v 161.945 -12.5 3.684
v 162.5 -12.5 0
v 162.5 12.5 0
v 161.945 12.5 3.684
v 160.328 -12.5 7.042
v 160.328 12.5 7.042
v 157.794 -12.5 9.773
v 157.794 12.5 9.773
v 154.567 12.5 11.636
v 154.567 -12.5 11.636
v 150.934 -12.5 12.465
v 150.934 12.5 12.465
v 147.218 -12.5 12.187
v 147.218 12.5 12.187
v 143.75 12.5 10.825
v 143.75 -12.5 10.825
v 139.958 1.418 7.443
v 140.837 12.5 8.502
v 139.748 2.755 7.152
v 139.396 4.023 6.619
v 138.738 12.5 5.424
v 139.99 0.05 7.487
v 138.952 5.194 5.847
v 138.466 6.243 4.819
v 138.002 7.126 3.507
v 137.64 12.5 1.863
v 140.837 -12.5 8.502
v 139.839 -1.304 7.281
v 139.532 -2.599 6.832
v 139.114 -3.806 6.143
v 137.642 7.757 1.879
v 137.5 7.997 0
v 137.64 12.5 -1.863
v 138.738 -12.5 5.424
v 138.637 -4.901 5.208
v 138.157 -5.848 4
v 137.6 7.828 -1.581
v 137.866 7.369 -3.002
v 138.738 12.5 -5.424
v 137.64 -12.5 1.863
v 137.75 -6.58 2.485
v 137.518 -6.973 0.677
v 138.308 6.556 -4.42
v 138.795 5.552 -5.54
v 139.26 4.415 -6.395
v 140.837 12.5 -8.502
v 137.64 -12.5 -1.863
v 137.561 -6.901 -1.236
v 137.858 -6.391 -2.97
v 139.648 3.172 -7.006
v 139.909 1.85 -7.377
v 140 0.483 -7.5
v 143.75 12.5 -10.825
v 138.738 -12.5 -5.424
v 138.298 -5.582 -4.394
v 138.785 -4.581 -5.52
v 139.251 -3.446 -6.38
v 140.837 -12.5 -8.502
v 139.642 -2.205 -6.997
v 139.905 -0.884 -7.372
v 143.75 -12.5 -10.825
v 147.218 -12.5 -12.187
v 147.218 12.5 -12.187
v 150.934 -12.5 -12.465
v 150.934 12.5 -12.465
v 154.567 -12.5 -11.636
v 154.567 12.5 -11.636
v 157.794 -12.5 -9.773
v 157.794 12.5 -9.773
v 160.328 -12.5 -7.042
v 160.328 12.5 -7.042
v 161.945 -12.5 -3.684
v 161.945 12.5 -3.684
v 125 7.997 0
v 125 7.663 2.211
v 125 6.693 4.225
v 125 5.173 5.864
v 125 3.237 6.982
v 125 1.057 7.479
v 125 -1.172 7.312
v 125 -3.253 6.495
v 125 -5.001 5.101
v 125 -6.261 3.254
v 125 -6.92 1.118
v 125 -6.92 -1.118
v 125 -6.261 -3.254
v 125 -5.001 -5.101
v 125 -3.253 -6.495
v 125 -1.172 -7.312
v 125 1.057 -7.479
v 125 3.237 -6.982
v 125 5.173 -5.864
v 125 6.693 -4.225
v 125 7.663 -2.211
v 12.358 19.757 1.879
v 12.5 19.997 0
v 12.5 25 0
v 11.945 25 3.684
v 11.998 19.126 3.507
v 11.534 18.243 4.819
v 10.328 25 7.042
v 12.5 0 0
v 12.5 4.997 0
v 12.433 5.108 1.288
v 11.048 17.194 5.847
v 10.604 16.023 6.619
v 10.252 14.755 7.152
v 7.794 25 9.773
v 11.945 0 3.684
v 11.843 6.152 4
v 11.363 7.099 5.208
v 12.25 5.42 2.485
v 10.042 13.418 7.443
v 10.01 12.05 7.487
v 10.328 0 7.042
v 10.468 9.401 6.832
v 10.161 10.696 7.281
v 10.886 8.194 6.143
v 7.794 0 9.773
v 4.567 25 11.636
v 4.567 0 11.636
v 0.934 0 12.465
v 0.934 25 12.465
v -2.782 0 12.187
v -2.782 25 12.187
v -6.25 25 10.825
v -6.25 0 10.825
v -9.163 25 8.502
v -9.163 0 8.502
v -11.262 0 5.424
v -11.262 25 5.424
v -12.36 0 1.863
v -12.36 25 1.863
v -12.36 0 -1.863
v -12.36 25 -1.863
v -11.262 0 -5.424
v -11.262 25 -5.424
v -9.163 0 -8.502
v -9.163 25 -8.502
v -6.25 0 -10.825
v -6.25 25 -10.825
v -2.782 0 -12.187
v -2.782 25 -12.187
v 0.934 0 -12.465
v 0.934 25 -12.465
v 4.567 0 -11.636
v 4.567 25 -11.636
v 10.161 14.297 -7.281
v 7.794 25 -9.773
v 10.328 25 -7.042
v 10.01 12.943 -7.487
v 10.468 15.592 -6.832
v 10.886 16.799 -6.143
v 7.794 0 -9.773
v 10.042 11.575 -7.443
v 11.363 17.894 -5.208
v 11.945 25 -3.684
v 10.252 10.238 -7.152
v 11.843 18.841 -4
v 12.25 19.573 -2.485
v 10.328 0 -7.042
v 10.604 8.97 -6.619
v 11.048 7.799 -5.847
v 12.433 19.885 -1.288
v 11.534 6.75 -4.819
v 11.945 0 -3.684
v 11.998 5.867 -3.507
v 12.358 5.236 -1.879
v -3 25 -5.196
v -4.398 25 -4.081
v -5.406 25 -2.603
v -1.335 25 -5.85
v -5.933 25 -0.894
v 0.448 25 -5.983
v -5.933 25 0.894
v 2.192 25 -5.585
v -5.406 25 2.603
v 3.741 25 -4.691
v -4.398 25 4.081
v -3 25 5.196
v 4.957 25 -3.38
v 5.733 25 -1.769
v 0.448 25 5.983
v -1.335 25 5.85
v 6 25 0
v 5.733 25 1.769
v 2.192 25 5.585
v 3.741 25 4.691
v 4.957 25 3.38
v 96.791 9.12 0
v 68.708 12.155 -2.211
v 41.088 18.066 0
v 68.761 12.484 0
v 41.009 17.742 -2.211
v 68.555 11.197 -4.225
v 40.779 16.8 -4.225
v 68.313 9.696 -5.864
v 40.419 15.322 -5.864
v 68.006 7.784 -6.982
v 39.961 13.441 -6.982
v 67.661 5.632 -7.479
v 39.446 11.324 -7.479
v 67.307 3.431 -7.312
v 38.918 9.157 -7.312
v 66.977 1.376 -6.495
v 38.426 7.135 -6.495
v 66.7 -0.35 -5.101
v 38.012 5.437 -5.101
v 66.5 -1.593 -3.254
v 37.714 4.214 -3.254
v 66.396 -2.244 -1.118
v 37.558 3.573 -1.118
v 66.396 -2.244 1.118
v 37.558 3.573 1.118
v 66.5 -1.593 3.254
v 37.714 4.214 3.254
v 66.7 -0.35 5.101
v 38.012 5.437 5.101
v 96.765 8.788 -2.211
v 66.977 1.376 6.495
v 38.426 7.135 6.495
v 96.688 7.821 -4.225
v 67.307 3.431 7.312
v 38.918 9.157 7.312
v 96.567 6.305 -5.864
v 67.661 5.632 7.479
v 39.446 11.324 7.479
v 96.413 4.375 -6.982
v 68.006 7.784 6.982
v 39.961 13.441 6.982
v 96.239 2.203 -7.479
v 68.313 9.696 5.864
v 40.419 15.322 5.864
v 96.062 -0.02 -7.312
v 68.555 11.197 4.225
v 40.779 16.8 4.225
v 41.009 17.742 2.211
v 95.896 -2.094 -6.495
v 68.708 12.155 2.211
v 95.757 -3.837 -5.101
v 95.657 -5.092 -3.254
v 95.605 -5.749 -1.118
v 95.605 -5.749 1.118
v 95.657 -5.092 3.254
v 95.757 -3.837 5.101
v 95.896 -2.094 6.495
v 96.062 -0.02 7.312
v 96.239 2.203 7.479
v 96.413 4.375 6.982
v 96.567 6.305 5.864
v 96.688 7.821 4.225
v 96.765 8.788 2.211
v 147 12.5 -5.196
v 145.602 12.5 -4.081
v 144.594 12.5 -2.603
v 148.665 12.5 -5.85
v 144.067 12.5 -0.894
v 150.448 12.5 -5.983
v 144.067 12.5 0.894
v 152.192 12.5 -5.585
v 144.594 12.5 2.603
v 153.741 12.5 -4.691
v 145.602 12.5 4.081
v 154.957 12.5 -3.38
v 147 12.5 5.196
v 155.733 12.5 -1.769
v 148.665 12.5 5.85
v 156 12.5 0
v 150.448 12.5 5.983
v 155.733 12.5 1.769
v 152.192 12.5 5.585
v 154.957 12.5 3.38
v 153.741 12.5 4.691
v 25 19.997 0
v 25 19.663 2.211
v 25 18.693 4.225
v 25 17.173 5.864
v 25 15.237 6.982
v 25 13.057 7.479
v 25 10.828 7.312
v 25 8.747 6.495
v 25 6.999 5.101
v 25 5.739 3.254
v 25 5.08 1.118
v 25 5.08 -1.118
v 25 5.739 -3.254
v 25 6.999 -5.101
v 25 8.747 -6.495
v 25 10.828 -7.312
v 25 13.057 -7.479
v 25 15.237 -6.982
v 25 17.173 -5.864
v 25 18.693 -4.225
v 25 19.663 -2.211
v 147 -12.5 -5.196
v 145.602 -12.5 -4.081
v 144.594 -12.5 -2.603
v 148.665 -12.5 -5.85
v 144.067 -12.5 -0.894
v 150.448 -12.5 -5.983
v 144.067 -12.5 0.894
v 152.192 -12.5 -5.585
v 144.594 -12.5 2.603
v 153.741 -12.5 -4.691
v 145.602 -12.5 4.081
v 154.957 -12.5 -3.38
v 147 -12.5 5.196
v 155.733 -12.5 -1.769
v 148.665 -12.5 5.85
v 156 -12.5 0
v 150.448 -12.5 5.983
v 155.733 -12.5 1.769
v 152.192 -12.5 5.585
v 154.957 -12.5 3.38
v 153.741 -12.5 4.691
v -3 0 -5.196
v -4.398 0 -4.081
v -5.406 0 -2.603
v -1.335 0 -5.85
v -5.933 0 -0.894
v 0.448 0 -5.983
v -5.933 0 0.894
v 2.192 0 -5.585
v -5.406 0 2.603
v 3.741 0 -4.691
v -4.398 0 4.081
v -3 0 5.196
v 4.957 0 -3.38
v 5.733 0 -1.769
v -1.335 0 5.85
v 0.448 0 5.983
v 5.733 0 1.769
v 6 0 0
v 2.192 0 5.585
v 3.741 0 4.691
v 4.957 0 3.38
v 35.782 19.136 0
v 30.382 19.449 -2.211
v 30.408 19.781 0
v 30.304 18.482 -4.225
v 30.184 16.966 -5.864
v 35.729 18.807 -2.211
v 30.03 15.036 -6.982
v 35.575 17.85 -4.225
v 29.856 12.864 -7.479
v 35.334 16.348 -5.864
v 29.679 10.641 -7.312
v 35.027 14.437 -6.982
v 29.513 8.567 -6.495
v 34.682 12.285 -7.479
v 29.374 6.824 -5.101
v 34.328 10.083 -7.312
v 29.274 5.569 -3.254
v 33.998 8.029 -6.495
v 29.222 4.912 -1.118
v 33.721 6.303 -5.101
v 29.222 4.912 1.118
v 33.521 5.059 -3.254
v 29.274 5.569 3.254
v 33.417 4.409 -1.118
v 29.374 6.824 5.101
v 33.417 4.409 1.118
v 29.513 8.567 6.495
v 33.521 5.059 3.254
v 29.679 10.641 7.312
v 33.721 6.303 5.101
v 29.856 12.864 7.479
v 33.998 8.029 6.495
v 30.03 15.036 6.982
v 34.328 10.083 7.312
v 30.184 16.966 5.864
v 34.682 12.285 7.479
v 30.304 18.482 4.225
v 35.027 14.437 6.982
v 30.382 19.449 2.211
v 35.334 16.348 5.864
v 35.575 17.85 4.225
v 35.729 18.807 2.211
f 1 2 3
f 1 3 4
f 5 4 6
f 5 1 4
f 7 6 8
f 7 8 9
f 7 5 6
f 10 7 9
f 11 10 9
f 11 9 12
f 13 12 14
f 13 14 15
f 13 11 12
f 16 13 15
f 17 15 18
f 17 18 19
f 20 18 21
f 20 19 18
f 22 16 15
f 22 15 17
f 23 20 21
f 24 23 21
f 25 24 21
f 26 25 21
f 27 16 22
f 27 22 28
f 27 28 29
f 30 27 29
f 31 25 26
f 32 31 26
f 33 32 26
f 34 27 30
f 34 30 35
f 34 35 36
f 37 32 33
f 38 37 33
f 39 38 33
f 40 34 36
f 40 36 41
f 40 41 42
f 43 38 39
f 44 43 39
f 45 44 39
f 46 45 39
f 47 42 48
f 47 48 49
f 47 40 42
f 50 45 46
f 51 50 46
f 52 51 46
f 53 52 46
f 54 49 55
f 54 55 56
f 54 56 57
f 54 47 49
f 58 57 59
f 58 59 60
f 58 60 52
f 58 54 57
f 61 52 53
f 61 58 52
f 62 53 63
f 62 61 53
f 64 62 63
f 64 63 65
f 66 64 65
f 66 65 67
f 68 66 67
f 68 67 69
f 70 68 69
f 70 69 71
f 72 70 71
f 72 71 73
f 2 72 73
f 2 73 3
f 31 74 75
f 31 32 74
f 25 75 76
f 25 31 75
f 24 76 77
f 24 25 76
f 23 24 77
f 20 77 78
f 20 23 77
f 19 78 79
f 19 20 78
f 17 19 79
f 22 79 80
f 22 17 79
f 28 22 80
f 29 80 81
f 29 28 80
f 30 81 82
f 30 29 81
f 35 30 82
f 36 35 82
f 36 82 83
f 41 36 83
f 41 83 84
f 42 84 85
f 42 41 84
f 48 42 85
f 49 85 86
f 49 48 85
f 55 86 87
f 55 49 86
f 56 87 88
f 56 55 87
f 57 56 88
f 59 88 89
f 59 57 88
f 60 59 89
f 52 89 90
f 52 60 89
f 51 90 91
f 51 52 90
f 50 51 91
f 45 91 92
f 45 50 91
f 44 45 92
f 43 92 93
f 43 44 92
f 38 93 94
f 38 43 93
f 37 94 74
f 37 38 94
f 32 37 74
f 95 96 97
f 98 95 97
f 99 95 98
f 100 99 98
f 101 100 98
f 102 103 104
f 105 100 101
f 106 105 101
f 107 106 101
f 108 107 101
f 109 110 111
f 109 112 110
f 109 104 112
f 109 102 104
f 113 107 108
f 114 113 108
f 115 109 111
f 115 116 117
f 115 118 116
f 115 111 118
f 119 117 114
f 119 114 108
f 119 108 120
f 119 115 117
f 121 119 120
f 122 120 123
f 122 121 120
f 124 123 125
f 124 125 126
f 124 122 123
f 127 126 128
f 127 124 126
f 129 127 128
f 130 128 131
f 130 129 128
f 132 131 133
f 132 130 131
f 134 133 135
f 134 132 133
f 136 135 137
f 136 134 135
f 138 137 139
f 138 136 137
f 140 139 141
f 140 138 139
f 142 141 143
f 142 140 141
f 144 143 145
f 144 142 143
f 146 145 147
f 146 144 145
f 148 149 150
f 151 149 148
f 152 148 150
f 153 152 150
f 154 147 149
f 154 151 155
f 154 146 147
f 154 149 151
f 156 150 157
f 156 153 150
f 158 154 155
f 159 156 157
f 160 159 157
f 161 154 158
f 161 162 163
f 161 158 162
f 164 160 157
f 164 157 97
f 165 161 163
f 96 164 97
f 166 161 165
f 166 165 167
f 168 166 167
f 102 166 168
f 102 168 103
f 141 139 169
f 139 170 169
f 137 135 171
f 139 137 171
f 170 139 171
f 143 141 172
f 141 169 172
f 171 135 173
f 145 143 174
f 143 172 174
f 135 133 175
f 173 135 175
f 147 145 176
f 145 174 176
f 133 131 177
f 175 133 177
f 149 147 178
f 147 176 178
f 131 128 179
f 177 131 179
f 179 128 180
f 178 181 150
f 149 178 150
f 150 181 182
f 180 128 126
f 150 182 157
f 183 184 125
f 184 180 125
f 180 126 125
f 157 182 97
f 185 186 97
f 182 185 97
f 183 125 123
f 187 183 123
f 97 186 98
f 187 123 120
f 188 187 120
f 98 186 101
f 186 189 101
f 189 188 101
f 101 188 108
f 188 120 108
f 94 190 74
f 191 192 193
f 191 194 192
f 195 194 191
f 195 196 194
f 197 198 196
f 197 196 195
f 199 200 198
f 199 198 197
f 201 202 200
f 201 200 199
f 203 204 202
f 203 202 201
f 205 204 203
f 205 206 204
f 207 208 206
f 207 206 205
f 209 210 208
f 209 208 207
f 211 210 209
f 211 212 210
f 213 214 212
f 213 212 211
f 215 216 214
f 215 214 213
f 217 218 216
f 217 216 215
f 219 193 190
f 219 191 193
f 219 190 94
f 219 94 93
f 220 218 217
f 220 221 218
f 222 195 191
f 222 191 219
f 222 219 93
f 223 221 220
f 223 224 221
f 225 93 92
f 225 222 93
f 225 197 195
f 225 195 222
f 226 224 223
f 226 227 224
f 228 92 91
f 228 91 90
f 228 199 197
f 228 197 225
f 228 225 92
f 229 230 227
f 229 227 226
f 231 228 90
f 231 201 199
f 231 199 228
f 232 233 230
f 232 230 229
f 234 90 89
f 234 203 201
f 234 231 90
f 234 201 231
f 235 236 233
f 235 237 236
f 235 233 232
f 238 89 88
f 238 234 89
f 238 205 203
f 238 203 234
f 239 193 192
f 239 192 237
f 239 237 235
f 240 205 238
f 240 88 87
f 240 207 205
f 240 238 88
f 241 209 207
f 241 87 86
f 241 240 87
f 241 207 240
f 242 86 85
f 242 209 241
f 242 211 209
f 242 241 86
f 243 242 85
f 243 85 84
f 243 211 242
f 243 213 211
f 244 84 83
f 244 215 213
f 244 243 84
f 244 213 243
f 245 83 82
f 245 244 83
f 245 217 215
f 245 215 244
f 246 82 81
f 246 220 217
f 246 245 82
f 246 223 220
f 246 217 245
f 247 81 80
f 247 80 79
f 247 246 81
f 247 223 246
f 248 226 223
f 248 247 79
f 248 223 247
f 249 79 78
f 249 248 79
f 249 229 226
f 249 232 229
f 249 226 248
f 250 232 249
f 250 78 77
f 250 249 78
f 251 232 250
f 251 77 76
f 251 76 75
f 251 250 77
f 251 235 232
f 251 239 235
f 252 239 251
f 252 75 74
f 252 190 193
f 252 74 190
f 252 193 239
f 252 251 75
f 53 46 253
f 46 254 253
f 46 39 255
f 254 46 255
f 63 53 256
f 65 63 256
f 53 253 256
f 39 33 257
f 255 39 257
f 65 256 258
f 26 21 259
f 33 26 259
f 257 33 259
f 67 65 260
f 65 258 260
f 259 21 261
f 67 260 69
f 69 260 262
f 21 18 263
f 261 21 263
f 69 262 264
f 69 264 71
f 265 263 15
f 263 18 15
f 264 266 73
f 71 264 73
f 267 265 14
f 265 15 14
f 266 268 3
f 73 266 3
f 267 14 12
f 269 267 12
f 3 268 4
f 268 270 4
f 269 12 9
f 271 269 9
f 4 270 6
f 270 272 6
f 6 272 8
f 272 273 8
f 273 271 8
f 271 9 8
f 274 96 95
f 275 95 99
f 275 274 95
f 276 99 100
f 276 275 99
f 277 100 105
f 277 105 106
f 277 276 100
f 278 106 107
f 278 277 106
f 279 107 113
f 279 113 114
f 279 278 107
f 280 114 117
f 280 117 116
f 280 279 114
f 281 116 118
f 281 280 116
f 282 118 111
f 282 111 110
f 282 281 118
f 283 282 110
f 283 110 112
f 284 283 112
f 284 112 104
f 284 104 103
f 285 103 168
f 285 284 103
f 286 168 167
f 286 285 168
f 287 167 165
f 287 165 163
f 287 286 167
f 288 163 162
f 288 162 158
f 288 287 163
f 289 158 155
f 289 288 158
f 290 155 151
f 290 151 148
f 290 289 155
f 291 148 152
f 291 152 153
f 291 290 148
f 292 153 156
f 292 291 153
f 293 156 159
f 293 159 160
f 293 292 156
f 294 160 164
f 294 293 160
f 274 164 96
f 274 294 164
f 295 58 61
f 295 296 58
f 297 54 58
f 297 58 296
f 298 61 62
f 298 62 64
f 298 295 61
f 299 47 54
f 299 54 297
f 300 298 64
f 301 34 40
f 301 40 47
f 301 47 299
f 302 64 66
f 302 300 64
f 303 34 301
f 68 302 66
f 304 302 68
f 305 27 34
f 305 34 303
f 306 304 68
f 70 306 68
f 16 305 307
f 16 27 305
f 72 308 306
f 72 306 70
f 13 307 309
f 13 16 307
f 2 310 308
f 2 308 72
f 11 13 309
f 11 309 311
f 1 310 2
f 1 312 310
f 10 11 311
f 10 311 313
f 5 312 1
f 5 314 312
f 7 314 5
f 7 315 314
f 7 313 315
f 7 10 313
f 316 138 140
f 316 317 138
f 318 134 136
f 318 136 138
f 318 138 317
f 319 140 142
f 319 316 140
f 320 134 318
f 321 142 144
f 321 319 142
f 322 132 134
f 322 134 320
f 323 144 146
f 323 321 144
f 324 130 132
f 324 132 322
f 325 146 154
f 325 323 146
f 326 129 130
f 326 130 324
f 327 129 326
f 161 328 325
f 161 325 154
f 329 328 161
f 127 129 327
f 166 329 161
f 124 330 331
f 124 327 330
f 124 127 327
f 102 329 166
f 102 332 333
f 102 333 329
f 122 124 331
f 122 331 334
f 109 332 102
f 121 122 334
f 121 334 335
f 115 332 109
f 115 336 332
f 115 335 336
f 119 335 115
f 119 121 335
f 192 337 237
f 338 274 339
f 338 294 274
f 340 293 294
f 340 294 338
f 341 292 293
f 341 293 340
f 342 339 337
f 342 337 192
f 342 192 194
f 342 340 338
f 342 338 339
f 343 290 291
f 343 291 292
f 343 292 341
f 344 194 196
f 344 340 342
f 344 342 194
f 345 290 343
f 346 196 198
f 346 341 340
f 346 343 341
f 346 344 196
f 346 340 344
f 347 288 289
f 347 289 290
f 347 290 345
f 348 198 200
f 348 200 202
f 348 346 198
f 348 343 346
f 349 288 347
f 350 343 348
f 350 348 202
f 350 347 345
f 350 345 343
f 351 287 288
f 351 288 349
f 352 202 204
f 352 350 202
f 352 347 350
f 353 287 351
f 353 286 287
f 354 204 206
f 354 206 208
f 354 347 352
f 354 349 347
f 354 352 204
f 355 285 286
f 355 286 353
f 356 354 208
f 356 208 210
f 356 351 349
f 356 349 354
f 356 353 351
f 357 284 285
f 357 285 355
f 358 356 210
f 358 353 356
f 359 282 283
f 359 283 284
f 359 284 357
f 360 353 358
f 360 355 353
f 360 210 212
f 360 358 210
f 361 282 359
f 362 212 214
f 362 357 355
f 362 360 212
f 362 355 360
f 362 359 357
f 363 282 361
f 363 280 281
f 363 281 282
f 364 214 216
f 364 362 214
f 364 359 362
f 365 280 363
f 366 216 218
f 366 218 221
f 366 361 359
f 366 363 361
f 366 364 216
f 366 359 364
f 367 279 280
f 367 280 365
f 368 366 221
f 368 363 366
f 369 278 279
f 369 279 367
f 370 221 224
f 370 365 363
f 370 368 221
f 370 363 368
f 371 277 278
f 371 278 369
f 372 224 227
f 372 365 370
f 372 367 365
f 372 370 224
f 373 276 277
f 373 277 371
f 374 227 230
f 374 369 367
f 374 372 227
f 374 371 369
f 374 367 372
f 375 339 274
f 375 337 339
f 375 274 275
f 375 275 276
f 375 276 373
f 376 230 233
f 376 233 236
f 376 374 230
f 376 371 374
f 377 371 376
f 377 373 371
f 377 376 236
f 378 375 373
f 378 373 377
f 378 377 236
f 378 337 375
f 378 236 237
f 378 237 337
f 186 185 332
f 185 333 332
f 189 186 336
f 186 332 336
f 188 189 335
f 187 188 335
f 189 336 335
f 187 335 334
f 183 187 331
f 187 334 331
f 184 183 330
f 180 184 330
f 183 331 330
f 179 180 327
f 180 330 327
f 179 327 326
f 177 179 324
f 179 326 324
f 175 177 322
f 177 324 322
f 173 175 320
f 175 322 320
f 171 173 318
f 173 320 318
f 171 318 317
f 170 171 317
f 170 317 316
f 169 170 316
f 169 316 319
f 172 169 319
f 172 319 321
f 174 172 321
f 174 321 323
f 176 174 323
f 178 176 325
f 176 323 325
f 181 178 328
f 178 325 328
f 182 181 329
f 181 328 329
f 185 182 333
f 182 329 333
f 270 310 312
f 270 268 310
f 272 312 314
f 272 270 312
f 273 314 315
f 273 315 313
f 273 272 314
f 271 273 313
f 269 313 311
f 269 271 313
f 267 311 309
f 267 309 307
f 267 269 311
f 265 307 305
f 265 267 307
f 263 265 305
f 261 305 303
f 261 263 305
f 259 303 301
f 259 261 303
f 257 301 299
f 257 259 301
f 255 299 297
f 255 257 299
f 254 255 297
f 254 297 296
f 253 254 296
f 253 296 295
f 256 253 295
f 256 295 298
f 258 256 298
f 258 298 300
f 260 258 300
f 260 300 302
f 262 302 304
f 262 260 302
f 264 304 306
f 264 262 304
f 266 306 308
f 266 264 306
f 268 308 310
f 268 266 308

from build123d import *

# Parameters (mm, degrees)
F0_R     = 12.5
F0_R_2   = 6
F1_DEPTH = 25
F2_R     = 12.5
F2_R_2   = 6
F3_DEPTH = 12.5
F5_R     = 7.5
F7_DEPTH = 25.0010001
F8_DEPTH = 25


with BuildPart() as f1:
    # F0 (on Front) → F1 (new body)
    with BuildSketch(Plane.XZ):
        Circle(F0_R)
        Circle(F0_R_2, mode=Mode.SUBTRACT)
    extrude(amount=-F1_DEPTH)



with BuildPart() as f3:
    # F2 (on Front) → F3 (new body, symmetric)
    with BuildSketch(Plane.XZ):
        with Locations((150, 0)):
            Circle(F2_R)
        with Locations((150, 0)):
            Circle(F2_R_2, mode=Mode.SUBTRACT)
    extrude(amount=F3_DEPTH, both=True)


with BuildPart() as f1_1:
    add(f1.part)

    add(f3.part)  # F6 merges F3
    # F6: sweep along a path in F4
    with BuildLine(Plane.XY) as f6_path:
        Line((0, 12), (25, 12))
        ThreePointArc((25, 12), (32.1487132371, 11.5726103092), (39.1955835962, 10.2965299685))
        ThreePointArc((39.1955835962, 10.2965299685), (81.789999989, 2.5833332421), (125, 0))
        Line((125, 0), (150, 0))
    # F5 (on Right) → F6 (sweep)
    with BuildSketch(Plane.YZ):
        with Locations((12.4965049244, 0)):
            Circle(F5_R)
    sweep(path=f6_path.line)

    # F0 (on Front) → F7 (cut, through all)
    with BuildSketch(Plane.XZ):
        Circle(F0_R_2)
    extrude(amount=-F7_DEPTH, mode=Mode.SUBTRACT)

    # F2 (on Front) → F8 (cut, symmetric)
    with BuildSketch(Plane.XZ):
        with Locations((150, 0)):
            Circle(F2_R_2)
    extrude(amount=F8_DEPTH, both=True, mode=Mode.SUBTRACT)


solid = f1_1.part
